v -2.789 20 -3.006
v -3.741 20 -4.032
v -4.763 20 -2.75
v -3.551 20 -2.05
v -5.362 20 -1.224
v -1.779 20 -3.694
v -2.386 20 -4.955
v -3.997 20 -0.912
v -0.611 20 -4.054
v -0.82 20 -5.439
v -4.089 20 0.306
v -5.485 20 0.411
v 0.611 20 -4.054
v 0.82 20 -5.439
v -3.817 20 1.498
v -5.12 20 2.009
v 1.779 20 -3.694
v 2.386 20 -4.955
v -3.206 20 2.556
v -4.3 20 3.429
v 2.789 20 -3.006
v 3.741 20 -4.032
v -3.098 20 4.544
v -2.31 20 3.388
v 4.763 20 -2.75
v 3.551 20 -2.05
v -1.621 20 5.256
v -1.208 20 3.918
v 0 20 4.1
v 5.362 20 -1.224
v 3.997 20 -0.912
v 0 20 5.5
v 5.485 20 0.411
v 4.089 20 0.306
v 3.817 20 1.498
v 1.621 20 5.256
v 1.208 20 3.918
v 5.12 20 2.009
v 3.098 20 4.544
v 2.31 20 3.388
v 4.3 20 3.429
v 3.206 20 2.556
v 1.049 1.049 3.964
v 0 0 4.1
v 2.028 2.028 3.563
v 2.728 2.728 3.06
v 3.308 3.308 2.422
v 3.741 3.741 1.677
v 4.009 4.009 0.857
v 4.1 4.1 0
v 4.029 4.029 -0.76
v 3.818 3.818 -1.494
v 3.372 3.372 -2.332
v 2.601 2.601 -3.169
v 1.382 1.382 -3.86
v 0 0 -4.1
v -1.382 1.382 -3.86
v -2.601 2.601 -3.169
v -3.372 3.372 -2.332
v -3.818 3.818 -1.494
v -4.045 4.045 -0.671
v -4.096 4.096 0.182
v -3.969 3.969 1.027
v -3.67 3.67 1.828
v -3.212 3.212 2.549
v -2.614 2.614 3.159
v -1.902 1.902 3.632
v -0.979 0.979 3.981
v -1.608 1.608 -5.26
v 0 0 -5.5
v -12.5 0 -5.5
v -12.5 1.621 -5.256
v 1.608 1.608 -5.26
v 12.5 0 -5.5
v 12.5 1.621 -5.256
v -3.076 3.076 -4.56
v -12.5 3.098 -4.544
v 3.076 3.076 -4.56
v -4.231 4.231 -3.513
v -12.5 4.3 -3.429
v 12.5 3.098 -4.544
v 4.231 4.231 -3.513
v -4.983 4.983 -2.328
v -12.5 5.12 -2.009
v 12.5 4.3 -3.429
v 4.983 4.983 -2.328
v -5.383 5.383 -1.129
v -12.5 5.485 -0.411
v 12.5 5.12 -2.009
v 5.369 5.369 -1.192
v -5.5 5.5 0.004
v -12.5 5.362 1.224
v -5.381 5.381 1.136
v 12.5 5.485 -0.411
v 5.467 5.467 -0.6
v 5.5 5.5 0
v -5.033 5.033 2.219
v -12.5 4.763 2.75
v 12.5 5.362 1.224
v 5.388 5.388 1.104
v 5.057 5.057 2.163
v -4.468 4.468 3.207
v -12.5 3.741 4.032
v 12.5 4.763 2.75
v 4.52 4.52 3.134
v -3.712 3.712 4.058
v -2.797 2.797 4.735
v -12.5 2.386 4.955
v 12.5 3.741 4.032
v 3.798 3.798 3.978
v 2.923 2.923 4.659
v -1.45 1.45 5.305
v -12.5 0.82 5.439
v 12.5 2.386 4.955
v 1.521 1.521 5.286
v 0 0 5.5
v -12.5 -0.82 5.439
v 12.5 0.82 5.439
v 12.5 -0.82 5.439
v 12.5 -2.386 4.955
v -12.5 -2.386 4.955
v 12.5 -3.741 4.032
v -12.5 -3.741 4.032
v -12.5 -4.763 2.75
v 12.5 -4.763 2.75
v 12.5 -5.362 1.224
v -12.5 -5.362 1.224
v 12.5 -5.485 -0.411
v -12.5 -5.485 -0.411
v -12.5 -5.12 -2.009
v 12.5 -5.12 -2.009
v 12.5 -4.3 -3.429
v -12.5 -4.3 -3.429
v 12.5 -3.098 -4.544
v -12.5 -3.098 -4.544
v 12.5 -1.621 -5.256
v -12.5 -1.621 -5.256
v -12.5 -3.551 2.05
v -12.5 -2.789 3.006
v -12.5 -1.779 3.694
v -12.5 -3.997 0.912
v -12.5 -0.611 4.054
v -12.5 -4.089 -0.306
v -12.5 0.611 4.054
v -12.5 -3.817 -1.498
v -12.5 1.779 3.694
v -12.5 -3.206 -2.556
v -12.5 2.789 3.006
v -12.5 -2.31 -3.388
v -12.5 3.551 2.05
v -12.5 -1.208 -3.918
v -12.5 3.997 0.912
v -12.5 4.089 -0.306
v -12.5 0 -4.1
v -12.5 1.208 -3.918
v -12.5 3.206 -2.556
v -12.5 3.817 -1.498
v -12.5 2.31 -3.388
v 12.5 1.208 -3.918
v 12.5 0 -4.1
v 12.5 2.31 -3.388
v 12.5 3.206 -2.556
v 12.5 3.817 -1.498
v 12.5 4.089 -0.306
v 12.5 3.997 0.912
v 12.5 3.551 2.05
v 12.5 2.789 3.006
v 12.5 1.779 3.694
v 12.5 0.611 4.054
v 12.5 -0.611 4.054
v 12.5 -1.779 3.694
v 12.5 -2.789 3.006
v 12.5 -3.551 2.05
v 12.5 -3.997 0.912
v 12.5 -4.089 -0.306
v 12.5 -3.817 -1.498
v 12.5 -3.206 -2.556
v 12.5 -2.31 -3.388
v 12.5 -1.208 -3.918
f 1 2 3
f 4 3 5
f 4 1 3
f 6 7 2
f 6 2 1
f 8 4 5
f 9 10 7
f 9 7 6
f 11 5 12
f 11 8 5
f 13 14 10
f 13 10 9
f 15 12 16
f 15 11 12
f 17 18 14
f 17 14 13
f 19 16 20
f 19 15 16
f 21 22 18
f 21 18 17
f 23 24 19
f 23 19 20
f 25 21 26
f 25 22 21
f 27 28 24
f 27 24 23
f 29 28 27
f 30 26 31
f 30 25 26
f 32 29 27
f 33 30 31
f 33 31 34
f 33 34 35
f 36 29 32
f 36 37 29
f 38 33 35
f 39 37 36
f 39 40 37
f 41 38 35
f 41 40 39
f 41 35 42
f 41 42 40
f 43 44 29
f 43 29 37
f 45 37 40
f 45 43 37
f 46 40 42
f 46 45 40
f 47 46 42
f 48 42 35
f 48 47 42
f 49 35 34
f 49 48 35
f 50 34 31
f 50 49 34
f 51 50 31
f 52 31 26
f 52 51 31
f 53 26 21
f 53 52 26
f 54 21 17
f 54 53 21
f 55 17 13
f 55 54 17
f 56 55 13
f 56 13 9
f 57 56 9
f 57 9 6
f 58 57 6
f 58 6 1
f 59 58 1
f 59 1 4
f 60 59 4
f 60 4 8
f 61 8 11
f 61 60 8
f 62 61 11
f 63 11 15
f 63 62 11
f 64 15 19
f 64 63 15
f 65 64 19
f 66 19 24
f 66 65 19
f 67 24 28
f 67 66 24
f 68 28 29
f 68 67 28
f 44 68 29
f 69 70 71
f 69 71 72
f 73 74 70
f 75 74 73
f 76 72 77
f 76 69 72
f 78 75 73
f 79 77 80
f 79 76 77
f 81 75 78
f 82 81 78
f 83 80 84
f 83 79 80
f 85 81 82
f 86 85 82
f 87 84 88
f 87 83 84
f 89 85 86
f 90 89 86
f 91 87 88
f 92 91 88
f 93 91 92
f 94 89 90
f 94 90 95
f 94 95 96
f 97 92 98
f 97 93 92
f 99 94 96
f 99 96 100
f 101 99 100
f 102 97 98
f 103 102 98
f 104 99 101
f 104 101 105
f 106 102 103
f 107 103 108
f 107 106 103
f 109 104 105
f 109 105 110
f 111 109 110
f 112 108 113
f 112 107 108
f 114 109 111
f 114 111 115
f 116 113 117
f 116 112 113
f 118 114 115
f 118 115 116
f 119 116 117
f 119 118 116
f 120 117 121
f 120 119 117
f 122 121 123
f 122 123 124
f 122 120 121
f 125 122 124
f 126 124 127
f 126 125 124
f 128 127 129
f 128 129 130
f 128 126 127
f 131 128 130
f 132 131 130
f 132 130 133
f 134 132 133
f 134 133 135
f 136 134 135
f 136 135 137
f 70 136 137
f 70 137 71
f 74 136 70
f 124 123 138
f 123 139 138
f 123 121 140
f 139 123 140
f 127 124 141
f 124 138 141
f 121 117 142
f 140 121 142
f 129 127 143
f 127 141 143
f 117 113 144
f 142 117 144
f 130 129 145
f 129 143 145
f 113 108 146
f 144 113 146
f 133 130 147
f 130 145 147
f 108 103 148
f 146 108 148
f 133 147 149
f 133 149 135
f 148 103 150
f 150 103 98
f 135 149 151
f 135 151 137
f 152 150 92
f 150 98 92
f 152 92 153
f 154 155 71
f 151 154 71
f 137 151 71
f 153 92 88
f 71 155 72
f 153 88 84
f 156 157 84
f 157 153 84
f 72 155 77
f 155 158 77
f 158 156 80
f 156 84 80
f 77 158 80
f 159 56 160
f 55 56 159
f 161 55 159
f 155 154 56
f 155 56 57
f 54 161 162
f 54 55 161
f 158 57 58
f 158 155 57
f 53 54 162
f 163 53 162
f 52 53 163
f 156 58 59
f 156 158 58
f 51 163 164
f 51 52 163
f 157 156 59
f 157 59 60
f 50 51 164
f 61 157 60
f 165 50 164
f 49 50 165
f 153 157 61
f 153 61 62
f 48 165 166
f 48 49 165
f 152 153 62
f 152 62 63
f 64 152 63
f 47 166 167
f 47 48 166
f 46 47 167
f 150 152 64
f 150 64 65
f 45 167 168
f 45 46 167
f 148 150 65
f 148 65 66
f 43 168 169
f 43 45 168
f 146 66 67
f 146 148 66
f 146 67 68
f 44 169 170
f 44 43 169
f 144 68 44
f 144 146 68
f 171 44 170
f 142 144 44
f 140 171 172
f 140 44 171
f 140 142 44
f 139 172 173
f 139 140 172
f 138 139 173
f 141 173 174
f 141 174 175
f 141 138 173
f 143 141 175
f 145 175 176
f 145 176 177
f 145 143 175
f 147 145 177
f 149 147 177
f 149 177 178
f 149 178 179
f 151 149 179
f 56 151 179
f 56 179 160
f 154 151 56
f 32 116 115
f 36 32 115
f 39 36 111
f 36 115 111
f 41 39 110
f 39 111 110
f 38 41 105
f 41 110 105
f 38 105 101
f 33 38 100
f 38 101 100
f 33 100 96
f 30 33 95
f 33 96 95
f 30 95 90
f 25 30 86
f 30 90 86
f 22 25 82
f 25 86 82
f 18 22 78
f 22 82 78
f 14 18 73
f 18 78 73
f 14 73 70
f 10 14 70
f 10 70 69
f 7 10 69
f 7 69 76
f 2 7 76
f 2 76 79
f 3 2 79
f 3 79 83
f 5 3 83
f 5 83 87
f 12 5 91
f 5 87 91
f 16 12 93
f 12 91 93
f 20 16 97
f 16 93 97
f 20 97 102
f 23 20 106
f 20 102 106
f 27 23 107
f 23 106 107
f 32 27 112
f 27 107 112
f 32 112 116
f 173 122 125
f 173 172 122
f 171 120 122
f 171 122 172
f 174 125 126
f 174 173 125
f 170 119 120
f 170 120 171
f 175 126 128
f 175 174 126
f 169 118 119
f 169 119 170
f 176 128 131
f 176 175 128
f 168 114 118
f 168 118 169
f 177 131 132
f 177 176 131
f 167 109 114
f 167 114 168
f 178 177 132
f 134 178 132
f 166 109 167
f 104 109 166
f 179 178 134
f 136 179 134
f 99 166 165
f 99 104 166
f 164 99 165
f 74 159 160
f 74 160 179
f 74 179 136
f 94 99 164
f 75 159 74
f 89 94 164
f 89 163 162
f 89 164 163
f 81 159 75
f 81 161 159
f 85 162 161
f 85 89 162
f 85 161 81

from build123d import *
from build123d.topology import SkipClean

# Parameters (mm, degrees)
SKETCH_1_R          = 5.5
SKETCH_1_R_2        = 4.1
EXTRUDE_1_DEPTH     = 12.5
SKETCH_3_R          = 5.5
EXTRUDE_2_DEPTH     = 20
SKETCH_4_R          = 4.1
CUT_EXTRUDE_2_DEPTH = 22.5
SKETCH_5_R          = 4.1
CUT_EXTRUDE_3_DEPTH = 45


with BuildPart() as part:
    # 草图1 → 凸台-拉伸1 (new, symmetric)
    with BuildSketch(Plane(origin=(0, 0, 0), x_dir=(0, 0, -1), z_dir=(1, 0, 0))):
        Circle(SKETCH_1_R)
        Circle(SKETCH_1_R_2, mode=Mode.SUBTRACT)
    extrude(amount=EXTRUDE_1_DEPTH, both=True)

    # 草图3 → 凸台-拉伸2 (add)
    with BuildSketch(Plane(origin=(0, 0, 0), x_dir=(1, 0, 0), z_dir=(0, 1, 0))):
        with Locations(Location((0, 0, 0), (0, 0, 270))):
            Circle(SKETCH_3_R)
    extrude(amount=EXTRUDE_2_DEPTH)

    # 草图4 → 切除-拉伸2 (cut, symmetric)
    with SkipClean():  # the faces are left unmerged after this step: merging them gives an invalid solid
        with BuildSketch(Plane(origin=(0, 0, 0), x_dir=(0, 0, -1), z_dir=(1, 0, 0))):
            Circle(SKETCH_4_R)
        extrude(amount=CUT_EXTRUDE_2_DEPTH, both=True, mode=Mode.SUBTRACT)

    # 草图5 → 切除-拉伸3 (cut)
    with BuildSketch(Plane(origin=(0, 0, 0), x_dir=(1, 0, 0), z_dir=(0, 1, 0))):
        with Locations(Location((0, 0, 0), (0, 0, 270))):
            Circle(SKETCH_5_R)
    extrude(amount=CUT_EXTRUDE_3_DEPTH, mode=Mode.SUBTRACT)


solid = part.part
